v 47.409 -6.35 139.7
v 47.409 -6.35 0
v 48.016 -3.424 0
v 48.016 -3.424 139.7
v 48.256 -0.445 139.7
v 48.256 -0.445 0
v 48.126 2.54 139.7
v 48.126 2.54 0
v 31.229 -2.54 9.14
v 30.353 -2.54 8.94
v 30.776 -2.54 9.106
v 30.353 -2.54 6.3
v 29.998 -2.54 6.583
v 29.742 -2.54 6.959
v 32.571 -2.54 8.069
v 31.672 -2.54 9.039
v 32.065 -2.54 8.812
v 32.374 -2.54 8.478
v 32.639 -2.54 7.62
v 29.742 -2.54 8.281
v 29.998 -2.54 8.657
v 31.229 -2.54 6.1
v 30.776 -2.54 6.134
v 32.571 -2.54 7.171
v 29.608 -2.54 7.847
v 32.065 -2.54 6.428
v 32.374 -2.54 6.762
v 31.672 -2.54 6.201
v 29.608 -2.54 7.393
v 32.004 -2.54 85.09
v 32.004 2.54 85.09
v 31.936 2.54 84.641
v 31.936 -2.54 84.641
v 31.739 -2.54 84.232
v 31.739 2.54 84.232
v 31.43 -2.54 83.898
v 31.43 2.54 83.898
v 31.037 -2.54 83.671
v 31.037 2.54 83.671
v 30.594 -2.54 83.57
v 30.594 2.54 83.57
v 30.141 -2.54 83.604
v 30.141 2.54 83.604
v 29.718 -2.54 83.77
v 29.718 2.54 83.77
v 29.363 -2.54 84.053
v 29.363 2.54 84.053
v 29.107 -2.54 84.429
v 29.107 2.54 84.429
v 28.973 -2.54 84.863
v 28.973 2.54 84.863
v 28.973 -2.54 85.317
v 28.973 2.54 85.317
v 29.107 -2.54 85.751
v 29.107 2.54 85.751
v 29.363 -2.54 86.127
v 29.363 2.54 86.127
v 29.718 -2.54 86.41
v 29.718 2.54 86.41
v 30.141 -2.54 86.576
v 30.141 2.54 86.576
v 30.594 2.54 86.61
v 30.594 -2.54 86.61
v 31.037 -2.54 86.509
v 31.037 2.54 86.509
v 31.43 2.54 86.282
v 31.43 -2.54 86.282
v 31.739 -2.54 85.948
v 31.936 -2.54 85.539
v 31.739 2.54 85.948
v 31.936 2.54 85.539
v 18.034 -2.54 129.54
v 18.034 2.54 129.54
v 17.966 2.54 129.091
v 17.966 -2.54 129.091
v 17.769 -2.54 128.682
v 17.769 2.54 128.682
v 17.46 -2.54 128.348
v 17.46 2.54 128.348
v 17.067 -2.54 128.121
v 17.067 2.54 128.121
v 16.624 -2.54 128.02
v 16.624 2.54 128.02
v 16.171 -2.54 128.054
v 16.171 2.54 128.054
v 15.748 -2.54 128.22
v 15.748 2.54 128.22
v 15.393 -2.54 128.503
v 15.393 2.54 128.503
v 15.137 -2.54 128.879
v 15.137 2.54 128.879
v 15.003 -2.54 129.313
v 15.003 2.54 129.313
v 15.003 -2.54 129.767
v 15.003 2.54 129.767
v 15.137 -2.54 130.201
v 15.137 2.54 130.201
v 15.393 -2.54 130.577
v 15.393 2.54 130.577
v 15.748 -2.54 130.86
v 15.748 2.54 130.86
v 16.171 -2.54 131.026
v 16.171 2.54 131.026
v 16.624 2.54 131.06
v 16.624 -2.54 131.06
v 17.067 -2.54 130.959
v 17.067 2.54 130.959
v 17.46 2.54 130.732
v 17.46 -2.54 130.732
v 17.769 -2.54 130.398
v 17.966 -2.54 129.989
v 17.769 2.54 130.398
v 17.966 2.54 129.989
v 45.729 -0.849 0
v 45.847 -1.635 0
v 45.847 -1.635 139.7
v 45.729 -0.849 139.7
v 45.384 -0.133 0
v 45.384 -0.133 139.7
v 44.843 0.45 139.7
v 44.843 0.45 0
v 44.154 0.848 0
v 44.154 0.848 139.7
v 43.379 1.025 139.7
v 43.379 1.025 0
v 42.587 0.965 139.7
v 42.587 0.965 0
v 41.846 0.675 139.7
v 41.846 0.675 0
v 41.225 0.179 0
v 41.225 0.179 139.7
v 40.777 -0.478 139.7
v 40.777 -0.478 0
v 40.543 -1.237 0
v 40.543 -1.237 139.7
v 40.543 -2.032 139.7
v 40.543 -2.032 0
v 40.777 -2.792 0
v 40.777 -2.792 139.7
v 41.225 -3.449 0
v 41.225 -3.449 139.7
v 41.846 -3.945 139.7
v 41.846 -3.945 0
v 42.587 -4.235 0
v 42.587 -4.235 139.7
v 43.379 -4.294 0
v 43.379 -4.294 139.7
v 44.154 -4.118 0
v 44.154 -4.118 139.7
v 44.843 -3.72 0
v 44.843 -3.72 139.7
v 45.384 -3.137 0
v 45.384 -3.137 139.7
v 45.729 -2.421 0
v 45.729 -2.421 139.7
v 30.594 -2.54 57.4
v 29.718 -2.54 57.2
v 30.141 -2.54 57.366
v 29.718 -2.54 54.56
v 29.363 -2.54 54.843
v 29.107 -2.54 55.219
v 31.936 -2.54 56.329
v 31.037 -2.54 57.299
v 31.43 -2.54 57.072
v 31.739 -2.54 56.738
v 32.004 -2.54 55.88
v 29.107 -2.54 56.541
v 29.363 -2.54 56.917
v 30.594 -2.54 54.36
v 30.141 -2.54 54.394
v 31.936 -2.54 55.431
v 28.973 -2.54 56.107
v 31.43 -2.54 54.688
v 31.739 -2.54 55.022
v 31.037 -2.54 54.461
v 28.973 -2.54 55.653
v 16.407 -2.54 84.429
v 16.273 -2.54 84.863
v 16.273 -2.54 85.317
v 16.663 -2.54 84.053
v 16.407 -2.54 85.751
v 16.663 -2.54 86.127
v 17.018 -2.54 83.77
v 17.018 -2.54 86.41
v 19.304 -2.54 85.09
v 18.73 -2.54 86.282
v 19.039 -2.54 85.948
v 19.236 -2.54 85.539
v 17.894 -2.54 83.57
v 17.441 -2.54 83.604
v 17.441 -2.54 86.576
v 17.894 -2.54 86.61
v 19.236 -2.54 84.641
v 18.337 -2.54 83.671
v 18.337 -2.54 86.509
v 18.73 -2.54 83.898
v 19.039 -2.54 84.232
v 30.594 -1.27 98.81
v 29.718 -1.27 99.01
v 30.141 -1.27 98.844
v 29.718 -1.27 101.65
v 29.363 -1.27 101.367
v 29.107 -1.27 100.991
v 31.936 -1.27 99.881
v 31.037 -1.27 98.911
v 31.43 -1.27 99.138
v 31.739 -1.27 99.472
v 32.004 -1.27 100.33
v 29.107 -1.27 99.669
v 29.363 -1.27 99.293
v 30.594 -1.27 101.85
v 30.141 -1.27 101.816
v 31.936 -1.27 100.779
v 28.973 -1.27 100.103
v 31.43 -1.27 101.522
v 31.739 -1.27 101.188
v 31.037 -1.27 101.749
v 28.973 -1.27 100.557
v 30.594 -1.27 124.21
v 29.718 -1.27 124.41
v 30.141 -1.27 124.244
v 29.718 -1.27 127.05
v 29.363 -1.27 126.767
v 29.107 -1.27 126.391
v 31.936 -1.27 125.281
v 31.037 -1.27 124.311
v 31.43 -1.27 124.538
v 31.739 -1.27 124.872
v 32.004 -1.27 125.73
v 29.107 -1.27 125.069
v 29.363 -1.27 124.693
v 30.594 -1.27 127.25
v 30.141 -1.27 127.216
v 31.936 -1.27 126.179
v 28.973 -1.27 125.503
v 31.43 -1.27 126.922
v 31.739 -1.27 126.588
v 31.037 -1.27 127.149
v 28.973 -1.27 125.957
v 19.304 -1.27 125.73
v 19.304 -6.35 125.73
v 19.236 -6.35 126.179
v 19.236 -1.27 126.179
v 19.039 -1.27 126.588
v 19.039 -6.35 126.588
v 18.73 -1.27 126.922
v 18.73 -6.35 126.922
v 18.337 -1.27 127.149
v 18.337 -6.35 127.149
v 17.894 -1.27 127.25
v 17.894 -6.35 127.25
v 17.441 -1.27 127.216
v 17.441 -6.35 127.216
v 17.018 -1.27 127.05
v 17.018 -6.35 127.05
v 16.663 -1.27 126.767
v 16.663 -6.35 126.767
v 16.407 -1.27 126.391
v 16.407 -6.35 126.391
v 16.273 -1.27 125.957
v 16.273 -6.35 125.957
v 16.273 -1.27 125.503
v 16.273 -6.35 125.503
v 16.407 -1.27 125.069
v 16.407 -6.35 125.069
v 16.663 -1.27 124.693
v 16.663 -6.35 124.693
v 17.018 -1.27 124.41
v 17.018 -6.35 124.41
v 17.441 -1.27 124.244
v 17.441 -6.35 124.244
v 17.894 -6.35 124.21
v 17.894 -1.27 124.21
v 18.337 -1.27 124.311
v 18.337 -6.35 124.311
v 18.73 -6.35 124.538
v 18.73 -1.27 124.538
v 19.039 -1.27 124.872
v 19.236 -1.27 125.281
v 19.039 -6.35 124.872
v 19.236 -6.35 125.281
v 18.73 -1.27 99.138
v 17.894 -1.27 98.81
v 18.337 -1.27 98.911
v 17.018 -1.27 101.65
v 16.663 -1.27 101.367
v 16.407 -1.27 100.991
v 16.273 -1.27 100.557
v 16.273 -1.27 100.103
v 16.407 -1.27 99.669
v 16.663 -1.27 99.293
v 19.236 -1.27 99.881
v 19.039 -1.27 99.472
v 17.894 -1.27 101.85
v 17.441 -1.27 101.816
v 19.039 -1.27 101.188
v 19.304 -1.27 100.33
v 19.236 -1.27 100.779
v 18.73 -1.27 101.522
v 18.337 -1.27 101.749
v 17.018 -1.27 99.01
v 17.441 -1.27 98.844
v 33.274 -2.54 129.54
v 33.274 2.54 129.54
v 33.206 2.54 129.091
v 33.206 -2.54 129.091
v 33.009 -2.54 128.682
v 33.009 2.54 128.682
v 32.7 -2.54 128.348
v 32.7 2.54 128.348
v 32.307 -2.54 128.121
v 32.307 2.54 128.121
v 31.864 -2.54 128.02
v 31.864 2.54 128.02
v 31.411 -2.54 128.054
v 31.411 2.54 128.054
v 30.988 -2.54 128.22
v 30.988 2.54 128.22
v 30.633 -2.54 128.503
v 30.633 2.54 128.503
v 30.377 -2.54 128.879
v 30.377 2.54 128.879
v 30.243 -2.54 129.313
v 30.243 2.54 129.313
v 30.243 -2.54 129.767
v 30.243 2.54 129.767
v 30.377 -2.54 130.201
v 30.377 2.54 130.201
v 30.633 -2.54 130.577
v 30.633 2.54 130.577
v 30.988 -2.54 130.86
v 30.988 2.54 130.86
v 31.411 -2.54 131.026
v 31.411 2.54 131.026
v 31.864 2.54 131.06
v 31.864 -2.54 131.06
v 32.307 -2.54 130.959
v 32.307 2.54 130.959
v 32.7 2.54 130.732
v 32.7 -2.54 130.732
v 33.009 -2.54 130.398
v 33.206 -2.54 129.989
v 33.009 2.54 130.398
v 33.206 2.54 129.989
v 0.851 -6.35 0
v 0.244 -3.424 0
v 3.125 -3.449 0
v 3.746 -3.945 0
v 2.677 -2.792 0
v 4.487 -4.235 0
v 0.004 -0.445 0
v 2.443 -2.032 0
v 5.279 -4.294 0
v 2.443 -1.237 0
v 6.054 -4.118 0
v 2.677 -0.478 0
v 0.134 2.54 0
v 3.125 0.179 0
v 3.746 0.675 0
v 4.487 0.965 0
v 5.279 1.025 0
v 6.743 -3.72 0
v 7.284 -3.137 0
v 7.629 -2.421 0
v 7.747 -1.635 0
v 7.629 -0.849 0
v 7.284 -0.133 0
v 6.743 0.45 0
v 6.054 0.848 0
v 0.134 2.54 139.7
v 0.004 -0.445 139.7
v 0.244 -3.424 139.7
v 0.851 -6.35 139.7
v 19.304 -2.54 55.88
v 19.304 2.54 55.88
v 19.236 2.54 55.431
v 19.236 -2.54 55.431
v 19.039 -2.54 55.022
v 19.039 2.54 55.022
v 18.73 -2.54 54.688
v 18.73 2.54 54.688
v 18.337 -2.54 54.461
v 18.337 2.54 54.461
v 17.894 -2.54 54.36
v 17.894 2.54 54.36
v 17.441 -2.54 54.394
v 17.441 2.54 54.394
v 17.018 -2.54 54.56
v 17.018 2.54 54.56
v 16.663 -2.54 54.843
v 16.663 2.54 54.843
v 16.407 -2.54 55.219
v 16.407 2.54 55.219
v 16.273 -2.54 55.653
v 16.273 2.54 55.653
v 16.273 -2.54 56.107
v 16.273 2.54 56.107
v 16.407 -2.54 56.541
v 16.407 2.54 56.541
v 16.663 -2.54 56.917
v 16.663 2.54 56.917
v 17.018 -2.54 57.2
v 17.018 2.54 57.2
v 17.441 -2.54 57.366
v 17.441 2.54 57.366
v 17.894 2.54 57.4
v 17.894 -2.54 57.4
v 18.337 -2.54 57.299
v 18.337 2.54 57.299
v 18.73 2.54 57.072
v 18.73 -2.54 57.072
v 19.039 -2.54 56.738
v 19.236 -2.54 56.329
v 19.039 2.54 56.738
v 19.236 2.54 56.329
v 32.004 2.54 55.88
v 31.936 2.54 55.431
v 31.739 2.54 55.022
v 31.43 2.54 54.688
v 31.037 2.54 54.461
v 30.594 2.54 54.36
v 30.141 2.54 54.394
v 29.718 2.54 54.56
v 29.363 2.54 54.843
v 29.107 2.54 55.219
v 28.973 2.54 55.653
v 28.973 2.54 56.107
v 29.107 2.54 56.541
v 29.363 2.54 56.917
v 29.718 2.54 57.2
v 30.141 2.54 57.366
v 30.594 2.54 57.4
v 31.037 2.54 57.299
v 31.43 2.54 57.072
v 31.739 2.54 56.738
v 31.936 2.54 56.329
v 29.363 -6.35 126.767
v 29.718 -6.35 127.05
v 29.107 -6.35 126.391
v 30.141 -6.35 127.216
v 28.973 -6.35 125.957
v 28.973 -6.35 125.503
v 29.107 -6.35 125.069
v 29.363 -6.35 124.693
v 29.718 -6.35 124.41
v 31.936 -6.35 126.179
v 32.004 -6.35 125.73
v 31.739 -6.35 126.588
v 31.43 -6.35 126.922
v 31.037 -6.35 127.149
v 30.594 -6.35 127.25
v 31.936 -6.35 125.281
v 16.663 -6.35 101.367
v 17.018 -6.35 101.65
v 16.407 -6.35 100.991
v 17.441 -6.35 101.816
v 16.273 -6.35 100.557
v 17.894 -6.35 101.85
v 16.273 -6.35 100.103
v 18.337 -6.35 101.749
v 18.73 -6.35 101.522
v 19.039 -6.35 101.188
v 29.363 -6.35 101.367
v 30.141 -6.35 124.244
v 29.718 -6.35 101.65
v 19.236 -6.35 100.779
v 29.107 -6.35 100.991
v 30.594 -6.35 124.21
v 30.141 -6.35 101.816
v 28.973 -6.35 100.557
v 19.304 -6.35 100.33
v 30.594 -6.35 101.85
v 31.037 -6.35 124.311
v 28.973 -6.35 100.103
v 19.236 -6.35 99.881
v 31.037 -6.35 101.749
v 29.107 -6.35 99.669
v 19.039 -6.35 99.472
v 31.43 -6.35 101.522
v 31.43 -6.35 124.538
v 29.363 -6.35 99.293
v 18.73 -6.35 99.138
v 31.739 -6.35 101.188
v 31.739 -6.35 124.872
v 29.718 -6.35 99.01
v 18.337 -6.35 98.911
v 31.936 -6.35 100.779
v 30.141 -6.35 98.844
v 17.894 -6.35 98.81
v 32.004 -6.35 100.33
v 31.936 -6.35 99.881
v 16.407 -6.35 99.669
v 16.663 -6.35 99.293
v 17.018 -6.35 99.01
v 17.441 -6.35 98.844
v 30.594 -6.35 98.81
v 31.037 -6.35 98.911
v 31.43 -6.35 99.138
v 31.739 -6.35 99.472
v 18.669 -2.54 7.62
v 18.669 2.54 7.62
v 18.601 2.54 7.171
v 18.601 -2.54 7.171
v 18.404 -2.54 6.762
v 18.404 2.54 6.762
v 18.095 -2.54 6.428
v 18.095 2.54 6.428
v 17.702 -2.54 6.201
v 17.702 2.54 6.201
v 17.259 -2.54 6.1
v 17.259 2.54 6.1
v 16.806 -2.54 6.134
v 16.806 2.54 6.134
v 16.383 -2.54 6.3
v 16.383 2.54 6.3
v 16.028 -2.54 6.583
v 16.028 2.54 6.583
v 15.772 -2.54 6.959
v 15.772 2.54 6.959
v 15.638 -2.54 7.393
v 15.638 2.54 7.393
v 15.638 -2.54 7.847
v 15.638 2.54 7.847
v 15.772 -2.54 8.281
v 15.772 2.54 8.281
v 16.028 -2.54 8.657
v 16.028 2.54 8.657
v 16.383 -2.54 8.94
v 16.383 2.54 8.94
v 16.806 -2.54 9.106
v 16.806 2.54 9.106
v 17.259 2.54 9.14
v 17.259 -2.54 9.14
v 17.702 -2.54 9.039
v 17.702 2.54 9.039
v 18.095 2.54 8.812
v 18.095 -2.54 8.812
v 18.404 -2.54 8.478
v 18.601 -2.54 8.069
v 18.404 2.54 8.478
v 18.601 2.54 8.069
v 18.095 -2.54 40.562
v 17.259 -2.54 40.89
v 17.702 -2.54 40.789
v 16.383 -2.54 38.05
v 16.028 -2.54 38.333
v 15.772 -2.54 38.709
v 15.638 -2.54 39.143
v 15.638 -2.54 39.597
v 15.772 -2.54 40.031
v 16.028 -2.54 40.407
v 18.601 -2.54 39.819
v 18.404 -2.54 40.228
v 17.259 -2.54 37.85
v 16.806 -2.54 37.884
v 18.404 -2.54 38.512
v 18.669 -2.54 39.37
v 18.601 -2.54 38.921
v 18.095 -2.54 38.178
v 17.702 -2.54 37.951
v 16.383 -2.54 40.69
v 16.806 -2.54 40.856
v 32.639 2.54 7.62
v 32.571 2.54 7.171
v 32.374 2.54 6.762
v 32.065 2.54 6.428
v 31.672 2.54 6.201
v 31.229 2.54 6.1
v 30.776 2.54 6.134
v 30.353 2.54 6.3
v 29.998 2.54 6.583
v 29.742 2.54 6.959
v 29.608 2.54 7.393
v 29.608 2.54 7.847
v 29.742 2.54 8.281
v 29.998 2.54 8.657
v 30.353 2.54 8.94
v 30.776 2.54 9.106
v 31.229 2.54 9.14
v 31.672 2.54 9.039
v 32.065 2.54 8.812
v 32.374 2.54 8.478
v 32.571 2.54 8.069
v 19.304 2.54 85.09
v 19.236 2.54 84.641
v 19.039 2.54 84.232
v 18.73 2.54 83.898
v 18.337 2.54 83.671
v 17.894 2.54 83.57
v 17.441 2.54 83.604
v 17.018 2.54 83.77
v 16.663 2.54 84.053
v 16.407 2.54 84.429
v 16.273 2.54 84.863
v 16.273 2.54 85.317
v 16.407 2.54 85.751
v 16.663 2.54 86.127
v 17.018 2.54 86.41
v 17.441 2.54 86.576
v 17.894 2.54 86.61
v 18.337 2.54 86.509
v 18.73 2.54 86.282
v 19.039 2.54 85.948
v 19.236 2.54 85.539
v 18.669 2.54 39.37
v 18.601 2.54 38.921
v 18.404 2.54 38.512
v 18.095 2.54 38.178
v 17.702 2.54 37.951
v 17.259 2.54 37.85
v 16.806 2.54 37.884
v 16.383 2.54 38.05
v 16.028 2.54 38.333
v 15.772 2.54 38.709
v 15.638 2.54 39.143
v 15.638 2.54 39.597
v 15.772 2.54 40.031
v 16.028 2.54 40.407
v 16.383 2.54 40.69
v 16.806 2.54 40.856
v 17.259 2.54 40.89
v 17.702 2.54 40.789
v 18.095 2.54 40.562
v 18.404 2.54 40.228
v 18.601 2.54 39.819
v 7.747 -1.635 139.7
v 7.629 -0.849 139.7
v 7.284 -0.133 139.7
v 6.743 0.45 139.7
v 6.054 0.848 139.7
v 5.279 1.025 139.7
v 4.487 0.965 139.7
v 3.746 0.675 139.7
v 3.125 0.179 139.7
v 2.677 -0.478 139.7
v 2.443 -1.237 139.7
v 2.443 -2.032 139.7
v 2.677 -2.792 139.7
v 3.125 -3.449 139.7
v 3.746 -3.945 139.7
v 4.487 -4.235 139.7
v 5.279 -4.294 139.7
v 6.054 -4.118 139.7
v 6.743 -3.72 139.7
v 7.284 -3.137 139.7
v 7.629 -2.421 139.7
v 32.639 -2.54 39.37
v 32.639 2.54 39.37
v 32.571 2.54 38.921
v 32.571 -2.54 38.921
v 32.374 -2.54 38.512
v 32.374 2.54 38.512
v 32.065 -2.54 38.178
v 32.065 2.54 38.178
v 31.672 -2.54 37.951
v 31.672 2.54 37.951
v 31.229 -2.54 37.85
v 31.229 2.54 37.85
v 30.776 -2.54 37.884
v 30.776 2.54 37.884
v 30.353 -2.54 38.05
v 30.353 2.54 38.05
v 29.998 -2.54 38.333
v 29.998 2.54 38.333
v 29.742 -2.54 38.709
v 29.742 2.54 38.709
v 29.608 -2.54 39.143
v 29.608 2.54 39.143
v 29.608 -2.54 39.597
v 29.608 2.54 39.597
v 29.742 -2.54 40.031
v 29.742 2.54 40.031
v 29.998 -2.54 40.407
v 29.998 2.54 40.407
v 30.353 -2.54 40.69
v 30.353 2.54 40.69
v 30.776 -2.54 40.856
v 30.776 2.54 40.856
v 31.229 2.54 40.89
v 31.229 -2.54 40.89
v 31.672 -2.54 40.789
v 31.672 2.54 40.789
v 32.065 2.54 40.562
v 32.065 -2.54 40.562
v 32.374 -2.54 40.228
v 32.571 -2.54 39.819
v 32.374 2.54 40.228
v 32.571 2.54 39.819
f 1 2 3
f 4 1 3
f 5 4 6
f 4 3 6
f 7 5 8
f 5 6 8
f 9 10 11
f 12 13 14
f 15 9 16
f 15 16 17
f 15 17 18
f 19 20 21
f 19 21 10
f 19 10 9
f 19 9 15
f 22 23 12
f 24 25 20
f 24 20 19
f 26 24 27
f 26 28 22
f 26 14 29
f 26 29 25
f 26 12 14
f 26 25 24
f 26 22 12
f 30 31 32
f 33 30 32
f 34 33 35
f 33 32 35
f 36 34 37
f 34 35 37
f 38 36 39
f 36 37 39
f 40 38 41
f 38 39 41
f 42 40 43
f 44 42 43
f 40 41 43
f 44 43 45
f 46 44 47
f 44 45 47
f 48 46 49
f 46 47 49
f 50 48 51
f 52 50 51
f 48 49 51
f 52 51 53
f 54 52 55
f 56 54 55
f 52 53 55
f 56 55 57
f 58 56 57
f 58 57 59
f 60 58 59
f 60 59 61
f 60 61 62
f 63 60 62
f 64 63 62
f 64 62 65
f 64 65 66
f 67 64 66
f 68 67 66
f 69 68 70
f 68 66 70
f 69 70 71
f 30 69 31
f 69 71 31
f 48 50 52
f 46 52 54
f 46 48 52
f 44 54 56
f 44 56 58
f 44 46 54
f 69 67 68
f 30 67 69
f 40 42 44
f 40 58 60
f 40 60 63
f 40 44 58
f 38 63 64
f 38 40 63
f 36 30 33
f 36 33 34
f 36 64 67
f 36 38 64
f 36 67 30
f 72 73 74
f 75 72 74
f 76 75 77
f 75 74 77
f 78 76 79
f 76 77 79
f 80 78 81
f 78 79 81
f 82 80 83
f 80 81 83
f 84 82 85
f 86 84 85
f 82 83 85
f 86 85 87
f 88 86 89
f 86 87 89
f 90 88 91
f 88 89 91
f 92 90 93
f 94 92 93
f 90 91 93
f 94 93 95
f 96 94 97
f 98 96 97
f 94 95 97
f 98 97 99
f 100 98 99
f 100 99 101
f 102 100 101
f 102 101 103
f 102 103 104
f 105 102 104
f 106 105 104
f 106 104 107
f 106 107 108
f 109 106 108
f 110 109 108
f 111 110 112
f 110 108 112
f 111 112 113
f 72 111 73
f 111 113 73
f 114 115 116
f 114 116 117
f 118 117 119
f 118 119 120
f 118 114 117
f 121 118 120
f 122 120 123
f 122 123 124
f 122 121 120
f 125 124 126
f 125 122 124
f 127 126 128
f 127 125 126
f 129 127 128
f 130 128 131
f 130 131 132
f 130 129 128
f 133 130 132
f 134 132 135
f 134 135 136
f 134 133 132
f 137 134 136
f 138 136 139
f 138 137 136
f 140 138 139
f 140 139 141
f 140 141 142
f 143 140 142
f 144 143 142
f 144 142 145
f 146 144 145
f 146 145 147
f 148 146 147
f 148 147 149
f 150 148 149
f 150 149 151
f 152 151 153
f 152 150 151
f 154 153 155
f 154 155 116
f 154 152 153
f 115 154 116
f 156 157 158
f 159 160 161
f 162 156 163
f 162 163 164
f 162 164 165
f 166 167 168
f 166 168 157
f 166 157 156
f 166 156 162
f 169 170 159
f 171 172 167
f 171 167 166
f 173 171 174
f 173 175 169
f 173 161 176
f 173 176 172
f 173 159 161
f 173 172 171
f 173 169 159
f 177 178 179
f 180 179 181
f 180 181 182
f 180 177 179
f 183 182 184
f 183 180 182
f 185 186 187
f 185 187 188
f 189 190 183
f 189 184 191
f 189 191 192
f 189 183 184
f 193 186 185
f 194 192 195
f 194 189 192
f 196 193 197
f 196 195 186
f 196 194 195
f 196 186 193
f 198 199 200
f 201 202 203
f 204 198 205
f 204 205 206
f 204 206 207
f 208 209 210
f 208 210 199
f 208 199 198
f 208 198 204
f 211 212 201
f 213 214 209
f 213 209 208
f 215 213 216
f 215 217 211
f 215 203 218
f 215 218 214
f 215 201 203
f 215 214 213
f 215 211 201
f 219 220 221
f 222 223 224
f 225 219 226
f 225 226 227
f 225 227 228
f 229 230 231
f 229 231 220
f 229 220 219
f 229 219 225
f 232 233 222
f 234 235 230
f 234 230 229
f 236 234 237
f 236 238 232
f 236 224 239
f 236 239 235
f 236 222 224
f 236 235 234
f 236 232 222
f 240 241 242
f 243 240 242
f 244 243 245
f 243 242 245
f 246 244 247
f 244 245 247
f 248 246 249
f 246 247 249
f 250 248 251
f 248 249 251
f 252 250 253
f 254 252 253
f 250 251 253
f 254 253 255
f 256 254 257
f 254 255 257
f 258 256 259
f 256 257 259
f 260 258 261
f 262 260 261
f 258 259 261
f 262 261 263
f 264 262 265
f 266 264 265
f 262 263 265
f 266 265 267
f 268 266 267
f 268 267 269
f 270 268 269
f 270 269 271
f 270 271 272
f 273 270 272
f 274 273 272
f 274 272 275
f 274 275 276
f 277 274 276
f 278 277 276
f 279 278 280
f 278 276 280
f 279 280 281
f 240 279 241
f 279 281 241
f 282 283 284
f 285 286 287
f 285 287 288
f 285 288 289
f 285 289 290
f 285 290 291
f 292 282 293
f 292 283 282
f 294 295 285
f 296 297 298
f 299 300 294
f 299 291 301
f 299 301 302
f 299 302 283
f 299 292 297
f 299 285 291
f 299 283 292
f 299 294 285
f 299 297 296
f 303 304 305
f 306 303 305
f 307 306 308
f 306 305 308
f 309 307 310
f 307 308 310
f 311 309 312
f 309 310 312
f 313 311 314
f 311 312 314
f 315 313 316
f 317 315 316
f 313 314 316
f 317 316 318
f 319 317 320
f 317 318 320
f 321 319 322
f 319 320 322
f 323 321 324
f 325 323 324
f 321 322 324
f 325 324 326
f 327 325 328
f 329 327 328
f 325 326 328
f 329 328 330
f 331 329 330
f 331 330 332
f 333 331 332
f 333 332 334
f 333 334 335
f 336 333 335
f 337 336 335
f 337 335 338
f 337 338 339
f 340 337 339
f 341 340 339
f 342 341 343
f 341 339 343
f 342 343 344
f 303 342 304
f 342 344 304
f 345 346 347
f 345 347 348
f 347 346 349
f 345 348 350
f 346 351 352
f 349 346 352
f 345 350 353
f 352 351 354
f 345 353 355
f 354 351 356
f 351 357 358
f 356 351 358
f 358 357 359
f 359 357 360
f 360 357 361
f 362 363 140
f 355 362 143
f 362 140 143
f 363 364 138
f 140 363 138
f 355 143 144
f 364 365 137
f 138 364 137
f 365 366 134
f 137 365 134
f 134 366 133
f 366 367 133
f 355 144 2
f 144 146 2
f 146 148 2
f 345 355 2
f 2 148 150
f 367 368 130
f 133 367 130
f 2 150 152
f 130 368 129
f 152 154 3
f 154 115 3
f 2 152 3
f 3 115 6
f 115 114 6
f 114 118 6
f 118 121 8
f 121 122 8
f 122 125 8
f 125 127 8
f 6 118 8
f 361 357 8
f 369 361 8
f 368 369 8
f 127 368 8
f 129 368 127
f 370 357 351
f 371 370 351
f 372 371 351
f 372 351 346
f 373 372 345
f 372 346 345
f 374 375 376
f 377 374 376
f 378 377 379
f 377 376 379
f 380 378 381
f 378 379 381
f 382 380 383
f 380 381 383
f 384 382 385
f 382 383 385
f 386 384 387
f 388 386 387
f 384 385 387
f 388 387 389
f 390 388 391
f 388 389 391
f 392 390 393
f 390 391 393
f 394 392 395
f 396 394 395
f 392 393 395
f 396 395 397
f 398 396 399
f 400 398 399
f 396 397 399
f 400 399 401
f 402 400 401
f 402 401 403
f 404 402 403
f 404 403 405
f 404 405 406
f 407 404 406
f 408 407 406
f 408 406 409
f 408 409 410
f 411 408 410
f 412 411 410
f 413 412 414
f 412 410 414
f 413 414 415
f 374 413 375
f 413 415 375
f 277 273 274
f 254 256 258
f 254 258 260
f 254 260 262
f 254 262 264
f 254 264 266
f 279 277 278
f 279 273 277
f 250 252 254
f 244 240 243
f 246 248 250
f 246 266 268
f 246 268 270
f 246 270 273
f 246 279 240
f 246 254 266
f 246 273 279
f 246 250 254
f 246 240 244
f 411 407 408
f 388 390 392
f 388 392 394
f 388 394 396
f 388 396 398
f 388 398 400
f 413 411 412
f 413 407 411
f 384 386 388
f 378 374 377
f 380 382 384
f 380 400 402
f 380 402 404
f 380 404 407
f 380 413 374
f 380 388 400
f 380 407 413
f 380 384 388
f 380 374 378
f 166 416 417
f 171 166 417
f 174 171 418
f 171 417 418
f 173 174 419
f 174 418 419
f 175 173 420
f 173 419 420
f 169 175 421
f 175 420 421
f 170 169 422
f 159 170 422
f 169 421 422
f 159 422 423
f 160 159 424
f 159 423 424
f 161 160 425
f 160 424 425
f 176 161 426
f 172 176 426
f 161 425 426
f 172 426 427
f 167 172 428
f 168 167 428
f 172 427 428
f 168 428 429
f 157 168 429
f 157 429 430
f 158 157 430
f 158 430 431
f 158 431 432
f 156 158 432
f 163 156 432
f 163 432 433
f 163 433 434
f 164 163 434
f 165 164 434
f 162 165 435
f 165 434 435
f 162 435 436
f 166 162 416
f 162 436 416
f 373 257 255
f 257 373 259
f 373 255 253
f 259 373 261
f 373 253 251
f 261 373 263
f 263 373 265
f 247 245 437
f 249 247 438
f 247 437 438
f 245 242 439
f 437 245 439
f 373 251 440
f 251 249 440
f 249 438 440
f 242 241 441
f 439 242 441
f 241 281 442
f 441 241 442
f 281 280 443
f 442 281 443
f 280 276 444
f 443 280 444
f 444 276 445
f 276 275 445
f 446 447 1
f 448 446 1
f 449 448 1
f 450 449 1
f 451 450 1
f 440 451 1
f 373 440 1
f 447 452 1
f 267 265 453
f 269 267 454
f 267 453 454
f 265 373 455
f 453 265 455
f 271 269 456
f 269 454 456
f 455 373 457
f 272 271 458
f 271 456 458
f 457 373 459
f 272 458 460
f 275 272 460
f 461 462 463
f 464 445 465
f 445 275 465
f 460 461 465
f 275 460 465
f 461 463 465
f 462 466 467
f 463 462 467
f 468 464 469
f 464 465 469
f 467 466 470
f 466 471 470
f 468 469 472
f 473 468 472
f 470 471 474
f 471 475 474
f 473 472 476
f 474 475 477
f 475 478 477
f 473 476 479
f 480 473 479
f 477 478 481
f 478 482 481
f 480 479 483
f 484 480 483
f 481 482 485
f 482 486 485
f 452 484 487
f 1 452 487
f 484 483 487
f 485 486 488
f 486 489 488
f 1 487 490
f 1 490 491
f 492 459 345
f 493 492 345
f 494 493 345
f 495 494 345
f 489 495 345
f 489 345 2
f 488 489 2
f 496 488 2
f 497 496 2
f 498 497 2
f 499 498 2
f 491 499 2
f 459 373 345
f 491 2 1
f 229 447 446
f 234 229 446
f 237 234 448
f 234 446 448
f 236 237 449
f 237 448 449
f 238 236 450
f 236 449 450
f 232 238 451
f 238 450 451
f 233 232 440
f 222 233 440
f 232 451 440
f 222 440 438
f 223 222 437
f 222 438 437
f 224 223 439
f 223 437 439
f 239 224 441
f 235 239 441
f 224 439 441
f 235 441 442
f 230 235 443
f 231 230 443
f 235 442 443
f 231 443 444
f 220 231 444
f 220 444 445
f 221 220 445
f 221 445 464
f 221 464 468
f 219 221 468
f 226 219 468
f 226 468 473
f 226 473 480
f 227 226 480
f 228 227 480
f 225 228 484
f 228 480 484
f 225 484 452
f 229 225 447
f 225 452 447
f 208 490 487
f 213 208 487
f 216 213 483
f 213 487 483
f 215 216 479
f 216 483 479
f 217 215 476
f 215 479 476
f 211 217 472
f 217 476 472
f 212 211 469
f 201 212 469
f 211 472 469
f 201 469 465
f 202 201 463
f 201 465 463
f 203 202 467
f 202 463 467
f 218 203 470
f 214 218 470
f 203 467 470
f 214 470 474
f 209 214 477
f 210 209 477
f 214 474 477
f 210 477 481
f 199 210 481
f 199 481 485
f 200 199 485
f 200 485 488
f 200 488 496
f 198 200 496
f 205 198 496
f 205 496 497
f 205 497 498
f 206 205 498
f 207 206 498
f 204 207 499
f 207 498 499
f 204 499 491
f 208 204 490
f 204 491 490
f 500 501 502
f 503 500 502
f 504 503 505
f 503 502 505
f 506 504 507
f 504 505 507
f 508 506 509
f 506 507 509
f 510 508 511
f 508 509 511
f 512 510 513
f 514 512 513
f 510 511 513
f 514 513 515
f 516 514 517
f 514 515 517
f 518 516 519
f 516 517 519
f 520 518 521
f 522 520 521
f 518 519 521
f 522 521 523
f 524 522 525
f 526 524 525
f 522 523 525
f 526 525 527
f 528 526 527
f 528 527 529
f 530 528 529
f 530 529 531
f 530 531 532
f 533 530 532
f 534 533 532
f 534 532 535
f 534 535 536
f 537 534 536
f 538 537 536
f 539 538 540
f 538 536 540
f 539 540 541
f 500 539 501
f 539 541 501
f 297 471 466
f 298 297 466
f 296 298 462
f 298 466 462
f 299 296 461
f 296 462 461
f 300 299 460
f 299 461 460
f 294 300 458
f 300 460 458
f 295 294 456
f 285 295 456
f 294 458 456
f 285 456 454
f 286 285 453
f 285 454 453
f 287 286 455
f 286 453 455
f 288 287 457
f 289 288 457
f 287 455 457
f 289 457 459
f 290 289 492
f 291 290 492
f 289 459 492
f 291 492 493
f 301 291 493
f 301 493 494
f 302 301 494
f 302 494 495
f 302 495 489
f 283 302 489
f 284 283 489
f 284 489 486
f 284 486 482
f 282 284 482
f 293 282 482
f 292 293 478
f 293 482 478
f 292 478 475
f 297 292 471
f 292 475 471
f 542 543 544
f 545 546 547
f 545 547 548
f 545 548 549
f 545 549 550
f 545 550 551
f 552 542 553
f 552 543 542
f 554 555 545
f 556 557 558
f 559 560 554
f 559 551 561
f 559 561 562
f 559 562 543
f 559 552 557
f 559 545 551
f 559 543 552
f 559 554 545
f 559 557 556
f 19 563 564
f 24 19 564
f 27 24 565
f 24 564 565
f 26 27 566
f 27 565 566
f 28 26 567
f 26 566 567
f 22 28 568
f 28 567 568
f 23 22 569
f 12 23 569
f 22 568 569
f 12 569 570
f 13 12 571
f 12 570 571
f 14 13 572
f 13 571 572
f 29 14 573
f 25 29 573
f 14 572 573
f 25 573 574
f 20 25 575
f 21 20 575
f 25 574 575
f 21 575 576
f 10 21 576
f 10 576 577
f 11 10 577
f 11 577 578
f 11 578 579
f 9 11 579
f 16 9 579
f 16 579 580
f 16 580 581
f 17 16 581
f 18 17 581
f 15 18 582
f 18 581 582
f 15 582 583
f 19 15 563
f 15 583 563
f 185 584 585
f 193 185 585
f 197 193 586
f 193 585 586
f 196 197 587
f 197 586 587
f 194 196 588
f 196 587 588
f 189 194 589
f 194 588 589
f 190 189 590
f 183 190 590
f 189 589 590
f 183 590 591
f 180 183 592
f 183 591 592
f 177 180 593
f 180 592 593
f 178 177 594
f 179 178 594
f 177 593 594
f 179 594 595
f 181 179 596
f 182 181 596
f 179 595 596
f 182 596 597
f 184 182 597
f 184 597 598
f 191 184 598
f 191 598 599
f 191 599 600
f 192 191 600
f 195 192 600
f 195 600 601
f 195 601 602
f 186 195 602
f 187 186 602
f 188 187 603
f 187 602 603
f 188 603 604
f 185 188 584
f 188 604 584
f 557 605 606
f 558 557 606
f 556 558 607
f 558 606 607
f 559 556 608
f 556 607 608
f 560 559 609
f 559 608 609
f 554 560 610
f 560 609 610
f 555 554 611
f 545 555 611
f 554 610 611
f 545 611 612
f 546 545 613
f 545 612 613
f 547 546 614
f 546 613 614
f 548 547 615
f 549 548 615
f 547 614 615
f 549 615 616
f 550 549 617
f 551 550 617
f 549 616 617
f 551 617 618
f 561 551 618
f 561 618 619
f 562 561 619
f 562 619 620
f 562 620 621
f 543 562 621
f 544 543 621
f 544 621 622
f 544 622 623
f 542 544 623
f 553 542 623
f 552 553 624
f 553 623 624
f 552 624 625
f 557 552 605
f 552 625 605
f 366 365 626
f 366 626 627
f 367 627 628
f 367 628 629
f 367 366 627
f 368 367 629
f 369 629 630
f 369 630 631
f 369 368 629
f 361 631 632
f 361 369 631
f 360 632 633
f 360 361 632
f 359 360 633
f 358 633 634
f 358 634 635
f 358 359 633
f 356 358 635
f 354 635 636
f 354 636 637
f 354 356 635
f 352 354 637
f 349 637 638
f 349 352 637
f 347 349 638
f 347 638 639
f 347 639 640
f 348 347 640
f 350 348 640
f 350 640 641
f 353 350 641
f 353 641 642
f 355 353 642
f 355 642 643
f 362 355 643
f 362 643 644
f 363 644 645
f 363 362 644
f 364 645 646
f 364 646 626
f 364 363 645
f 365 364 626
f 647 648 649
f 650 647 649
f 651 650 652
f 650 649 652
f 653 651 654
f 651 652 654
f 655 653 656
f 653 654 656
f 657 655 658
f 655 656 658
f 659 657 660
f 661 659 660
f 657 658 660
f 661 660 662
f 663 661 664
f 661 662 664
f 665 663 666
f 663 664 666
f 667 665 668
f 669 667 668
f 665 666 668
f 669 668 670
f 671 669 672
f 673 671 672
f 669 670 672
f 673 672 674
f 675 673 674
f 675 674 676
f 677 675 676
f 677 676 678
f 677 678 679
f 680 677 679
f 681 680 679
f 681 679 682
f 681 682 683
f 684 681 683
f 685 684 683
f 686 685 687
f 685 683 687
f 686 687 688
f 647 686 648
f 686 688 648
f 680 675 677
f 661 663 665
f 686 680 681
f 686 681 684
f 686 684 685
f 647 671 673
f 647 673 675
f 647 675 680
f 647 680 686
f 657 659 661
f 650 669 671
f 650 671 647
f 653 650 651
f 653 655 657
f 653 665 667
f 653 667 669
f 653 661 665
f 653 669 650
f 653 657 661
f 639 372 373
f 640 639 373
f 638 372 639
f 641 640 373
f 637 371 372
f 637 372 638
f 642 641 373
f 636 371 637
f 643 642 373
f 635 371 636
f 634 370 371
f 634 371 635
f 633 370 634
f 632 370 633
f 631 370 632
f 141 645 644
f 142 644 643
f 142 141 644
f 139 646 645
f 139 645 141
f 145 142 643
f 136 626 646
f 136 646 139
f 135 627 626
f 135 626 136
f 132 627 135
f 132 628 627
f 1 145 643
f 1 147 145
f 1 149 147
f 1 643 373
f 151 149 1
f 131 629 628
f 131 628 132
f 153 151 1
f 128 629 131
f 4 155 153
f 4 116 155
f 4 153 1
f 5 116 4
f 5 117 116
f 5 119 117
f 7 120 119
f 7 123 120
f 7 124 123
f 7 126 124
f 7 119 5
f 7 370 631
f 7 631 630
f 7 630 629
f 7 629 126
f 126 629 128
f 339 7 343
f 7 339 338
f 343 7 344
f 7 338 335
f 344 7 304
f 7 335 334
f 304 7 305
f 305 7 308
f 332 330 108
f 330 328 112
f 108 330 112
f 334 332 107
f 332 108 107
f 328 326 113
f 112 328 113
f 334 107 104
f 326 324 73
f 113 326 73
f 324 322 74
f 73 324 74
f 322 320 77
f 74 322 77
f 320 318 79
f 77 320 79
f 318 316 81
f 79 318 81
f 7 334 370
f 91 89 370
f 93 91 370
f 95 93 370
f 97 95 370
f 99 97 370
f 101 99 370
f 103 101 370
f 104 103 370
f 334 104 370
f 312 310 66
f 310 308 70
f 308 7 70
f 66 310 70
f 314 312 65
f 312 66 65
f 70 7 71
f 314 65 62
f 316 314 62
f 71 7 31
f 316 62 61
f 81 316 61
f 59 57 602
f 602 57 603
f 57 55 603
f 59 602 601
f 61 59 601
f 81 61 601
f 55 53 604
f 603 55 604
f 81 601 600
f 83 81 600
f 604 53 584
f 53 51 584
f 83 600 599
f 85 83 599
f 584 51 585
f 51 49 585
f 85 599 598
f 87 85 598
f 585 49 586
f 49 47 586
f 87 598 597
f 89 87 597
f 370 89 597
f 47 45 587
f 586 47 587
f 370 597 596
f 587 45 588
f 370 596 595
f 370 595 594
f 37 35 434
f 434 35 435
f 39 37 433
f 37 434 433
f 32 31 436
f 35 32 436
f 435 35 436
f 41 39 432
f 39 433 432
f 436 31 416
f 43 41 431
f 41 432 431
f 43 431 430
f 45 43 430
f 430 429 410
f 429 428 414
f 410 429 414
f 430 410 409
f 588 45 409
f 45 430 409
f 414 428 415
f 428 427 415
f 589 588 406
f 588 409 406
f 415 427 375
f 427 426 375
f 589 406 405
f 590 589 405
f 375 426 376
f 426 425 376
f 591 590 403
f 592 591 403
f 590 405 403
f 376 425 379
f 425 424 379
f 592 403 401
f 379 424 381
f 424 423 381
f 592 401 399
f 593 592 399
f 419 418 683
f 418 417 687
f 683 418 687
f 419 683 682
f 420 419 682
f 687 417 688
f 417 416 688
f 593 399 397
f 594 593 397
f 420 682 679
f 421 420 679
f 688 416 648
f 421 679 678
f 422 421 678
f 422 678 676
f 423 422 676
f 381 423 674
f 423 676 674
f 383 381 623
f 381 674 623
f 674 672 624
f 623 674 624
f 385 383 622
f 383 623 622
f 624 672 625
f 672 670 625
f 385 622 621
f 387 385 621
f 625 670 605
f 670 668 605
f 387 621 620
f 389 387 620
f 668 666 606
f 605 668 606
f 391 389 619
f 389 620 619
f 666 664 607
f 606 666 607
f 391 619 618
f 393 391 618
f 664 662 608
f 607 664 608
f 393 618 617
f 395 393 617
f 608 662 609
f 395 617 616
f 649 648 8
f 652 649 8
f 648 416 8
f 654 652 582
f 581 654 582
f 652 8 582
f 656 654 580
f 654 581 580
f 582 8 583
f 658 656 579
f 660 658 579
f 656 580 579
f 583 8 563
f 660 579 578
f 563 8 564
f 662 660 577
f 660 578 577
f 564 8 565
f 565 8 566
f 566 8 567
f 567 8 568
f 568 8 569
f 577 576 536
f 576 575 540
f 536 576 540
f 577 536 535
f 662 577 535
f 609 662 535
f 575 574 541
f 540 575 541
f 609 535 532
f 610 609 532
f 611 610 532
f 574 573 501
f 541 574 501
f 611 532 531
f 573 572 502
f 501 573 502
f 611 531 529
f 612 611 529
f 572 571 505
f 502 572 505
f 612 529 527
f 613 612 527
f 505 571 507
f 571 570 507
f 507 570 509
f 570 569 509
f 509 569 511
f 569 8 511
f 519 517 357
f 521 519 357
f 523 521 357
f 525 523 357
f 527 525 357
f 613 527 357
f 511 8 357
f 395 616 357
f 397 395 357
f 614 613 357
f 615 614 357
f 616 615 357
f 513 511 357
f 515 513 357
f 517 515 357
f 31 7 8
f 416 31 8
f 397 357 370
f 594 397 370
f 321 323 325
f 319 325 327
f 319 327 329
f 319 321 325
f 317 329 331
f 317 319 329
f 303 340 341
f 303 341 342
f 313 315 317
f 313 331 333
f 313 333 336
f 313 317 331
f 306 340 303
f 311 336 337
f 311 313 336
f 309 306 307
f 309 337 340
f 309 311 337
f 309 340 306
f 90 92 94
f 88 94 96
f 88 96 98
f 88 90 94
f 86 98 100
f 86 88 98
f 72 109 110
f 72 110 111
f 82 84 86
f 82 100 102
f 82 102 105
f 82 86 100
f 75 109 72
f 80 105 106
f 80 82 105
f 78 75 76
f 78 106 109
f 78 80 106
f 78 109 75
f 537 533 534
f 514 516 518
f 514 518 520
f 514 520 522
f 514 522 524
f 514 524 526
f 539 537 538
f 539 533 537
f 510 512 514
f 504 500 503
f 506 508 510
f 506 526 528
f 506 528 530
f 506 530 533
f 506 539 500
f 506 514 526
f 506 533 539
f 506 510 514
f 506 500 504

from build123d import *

# Parameters (mm, degrees)
SKETCH1_R           = 2.667
BOSS_EXTRUDE1_DEPTH = 139.7
SKETCH2_R           = 1.524
CUT_EXTRUDE1_DEPTH  = 5.08
SKETCH5_R           = 1.524
CUT_EXTRUDE2_DEPTH  = 5.08


with BuildPart() as part:
    # Sketch1 → Boss-Extrude1 (new body)
    with BuildSketch(Plane.XY):
        with BuildLine():
            ThreePointArc((0.134056593, 2.54), (0.077982482, -1.938389365), (0.85051547, -6.35))
            Line((0.85051547, -6.35), (47.40948453, -6.35))
            ThreePointArc((47.40948453, -6.35), (48.182017518, -1.938389365), (48.125943407, 2.54))
            Line((48.125943407, 2.54), (0.134056593, 2.54))
        make_face()
        with Locations((43.18, -1.634887509)):
            Circle(SKETCH1_R, mode=Mode.SUBTRACT)
        with Locations((5.08, -1.634887509)):
            Circle(SKETCH1_R, mode=Mode.SUBTRACT)
    extrude(amount=BOSS_EXTRUDE1_DEPTH)

    # Sketch2 → Cut-Extrude1 (cut)
    with BuildSketch(Plane(origin=(0, 2.54, 0), x_dir=(1, 0, 0), z_dir=(0, 1, 0))):
        with Locations((17.145, -7.62)):
            Circle(SKETCH2_R)
        with Locations((31.115, -7.62)):
            Circle(SKETCH2_R)
        with Locations((31.115, -39.37)):
            Circle(SKETCH2_R)
        with Locations((17.145, -39.37)):
            Circle(SKETCH2_R)
        with Locations((17.78, -55.88)):
            Circle(SKETCH2_R)
        with Locations((30.48, -55.88)):
            Circle(SKETCH2_R)
        with Locations((30.48, -85.09)):
            Circle(SKETCH2_R)
        with Locations((17.78, -85.09)):
            Circle(SKETCH2_R)
        with Locations((16.51, -129.54)):
            Circle(SKETCH2_R)
        with Locations((31.75, -129.54)):
            Circle(SKETCH2_R)
    extrude(amount=-CUT_EXTRUDE1_DEPTH, mode=Mode.SUBTRACT)

    # Sketch5 → Cut-Extrude2 (cut)
    with BuildSketch(Plane.XZ.offset(6.35)):
        with Locations((17.78, 125.73)):
            Circle(SKETCH5_R)
        with Locations((30.48, 125.73)):
            Circle(SKETCH5_R)
        with Locations((30.48, 100.33)):
            Circle(SKETCH5_R)
        with Locations((17.78, 100.33)):
            Circle(SKETCH5_R)
    extrude(amount=-CUT_EXTRUDE2_DEPTH, mode=Mode.SUBTRACT)


solid = part.part
